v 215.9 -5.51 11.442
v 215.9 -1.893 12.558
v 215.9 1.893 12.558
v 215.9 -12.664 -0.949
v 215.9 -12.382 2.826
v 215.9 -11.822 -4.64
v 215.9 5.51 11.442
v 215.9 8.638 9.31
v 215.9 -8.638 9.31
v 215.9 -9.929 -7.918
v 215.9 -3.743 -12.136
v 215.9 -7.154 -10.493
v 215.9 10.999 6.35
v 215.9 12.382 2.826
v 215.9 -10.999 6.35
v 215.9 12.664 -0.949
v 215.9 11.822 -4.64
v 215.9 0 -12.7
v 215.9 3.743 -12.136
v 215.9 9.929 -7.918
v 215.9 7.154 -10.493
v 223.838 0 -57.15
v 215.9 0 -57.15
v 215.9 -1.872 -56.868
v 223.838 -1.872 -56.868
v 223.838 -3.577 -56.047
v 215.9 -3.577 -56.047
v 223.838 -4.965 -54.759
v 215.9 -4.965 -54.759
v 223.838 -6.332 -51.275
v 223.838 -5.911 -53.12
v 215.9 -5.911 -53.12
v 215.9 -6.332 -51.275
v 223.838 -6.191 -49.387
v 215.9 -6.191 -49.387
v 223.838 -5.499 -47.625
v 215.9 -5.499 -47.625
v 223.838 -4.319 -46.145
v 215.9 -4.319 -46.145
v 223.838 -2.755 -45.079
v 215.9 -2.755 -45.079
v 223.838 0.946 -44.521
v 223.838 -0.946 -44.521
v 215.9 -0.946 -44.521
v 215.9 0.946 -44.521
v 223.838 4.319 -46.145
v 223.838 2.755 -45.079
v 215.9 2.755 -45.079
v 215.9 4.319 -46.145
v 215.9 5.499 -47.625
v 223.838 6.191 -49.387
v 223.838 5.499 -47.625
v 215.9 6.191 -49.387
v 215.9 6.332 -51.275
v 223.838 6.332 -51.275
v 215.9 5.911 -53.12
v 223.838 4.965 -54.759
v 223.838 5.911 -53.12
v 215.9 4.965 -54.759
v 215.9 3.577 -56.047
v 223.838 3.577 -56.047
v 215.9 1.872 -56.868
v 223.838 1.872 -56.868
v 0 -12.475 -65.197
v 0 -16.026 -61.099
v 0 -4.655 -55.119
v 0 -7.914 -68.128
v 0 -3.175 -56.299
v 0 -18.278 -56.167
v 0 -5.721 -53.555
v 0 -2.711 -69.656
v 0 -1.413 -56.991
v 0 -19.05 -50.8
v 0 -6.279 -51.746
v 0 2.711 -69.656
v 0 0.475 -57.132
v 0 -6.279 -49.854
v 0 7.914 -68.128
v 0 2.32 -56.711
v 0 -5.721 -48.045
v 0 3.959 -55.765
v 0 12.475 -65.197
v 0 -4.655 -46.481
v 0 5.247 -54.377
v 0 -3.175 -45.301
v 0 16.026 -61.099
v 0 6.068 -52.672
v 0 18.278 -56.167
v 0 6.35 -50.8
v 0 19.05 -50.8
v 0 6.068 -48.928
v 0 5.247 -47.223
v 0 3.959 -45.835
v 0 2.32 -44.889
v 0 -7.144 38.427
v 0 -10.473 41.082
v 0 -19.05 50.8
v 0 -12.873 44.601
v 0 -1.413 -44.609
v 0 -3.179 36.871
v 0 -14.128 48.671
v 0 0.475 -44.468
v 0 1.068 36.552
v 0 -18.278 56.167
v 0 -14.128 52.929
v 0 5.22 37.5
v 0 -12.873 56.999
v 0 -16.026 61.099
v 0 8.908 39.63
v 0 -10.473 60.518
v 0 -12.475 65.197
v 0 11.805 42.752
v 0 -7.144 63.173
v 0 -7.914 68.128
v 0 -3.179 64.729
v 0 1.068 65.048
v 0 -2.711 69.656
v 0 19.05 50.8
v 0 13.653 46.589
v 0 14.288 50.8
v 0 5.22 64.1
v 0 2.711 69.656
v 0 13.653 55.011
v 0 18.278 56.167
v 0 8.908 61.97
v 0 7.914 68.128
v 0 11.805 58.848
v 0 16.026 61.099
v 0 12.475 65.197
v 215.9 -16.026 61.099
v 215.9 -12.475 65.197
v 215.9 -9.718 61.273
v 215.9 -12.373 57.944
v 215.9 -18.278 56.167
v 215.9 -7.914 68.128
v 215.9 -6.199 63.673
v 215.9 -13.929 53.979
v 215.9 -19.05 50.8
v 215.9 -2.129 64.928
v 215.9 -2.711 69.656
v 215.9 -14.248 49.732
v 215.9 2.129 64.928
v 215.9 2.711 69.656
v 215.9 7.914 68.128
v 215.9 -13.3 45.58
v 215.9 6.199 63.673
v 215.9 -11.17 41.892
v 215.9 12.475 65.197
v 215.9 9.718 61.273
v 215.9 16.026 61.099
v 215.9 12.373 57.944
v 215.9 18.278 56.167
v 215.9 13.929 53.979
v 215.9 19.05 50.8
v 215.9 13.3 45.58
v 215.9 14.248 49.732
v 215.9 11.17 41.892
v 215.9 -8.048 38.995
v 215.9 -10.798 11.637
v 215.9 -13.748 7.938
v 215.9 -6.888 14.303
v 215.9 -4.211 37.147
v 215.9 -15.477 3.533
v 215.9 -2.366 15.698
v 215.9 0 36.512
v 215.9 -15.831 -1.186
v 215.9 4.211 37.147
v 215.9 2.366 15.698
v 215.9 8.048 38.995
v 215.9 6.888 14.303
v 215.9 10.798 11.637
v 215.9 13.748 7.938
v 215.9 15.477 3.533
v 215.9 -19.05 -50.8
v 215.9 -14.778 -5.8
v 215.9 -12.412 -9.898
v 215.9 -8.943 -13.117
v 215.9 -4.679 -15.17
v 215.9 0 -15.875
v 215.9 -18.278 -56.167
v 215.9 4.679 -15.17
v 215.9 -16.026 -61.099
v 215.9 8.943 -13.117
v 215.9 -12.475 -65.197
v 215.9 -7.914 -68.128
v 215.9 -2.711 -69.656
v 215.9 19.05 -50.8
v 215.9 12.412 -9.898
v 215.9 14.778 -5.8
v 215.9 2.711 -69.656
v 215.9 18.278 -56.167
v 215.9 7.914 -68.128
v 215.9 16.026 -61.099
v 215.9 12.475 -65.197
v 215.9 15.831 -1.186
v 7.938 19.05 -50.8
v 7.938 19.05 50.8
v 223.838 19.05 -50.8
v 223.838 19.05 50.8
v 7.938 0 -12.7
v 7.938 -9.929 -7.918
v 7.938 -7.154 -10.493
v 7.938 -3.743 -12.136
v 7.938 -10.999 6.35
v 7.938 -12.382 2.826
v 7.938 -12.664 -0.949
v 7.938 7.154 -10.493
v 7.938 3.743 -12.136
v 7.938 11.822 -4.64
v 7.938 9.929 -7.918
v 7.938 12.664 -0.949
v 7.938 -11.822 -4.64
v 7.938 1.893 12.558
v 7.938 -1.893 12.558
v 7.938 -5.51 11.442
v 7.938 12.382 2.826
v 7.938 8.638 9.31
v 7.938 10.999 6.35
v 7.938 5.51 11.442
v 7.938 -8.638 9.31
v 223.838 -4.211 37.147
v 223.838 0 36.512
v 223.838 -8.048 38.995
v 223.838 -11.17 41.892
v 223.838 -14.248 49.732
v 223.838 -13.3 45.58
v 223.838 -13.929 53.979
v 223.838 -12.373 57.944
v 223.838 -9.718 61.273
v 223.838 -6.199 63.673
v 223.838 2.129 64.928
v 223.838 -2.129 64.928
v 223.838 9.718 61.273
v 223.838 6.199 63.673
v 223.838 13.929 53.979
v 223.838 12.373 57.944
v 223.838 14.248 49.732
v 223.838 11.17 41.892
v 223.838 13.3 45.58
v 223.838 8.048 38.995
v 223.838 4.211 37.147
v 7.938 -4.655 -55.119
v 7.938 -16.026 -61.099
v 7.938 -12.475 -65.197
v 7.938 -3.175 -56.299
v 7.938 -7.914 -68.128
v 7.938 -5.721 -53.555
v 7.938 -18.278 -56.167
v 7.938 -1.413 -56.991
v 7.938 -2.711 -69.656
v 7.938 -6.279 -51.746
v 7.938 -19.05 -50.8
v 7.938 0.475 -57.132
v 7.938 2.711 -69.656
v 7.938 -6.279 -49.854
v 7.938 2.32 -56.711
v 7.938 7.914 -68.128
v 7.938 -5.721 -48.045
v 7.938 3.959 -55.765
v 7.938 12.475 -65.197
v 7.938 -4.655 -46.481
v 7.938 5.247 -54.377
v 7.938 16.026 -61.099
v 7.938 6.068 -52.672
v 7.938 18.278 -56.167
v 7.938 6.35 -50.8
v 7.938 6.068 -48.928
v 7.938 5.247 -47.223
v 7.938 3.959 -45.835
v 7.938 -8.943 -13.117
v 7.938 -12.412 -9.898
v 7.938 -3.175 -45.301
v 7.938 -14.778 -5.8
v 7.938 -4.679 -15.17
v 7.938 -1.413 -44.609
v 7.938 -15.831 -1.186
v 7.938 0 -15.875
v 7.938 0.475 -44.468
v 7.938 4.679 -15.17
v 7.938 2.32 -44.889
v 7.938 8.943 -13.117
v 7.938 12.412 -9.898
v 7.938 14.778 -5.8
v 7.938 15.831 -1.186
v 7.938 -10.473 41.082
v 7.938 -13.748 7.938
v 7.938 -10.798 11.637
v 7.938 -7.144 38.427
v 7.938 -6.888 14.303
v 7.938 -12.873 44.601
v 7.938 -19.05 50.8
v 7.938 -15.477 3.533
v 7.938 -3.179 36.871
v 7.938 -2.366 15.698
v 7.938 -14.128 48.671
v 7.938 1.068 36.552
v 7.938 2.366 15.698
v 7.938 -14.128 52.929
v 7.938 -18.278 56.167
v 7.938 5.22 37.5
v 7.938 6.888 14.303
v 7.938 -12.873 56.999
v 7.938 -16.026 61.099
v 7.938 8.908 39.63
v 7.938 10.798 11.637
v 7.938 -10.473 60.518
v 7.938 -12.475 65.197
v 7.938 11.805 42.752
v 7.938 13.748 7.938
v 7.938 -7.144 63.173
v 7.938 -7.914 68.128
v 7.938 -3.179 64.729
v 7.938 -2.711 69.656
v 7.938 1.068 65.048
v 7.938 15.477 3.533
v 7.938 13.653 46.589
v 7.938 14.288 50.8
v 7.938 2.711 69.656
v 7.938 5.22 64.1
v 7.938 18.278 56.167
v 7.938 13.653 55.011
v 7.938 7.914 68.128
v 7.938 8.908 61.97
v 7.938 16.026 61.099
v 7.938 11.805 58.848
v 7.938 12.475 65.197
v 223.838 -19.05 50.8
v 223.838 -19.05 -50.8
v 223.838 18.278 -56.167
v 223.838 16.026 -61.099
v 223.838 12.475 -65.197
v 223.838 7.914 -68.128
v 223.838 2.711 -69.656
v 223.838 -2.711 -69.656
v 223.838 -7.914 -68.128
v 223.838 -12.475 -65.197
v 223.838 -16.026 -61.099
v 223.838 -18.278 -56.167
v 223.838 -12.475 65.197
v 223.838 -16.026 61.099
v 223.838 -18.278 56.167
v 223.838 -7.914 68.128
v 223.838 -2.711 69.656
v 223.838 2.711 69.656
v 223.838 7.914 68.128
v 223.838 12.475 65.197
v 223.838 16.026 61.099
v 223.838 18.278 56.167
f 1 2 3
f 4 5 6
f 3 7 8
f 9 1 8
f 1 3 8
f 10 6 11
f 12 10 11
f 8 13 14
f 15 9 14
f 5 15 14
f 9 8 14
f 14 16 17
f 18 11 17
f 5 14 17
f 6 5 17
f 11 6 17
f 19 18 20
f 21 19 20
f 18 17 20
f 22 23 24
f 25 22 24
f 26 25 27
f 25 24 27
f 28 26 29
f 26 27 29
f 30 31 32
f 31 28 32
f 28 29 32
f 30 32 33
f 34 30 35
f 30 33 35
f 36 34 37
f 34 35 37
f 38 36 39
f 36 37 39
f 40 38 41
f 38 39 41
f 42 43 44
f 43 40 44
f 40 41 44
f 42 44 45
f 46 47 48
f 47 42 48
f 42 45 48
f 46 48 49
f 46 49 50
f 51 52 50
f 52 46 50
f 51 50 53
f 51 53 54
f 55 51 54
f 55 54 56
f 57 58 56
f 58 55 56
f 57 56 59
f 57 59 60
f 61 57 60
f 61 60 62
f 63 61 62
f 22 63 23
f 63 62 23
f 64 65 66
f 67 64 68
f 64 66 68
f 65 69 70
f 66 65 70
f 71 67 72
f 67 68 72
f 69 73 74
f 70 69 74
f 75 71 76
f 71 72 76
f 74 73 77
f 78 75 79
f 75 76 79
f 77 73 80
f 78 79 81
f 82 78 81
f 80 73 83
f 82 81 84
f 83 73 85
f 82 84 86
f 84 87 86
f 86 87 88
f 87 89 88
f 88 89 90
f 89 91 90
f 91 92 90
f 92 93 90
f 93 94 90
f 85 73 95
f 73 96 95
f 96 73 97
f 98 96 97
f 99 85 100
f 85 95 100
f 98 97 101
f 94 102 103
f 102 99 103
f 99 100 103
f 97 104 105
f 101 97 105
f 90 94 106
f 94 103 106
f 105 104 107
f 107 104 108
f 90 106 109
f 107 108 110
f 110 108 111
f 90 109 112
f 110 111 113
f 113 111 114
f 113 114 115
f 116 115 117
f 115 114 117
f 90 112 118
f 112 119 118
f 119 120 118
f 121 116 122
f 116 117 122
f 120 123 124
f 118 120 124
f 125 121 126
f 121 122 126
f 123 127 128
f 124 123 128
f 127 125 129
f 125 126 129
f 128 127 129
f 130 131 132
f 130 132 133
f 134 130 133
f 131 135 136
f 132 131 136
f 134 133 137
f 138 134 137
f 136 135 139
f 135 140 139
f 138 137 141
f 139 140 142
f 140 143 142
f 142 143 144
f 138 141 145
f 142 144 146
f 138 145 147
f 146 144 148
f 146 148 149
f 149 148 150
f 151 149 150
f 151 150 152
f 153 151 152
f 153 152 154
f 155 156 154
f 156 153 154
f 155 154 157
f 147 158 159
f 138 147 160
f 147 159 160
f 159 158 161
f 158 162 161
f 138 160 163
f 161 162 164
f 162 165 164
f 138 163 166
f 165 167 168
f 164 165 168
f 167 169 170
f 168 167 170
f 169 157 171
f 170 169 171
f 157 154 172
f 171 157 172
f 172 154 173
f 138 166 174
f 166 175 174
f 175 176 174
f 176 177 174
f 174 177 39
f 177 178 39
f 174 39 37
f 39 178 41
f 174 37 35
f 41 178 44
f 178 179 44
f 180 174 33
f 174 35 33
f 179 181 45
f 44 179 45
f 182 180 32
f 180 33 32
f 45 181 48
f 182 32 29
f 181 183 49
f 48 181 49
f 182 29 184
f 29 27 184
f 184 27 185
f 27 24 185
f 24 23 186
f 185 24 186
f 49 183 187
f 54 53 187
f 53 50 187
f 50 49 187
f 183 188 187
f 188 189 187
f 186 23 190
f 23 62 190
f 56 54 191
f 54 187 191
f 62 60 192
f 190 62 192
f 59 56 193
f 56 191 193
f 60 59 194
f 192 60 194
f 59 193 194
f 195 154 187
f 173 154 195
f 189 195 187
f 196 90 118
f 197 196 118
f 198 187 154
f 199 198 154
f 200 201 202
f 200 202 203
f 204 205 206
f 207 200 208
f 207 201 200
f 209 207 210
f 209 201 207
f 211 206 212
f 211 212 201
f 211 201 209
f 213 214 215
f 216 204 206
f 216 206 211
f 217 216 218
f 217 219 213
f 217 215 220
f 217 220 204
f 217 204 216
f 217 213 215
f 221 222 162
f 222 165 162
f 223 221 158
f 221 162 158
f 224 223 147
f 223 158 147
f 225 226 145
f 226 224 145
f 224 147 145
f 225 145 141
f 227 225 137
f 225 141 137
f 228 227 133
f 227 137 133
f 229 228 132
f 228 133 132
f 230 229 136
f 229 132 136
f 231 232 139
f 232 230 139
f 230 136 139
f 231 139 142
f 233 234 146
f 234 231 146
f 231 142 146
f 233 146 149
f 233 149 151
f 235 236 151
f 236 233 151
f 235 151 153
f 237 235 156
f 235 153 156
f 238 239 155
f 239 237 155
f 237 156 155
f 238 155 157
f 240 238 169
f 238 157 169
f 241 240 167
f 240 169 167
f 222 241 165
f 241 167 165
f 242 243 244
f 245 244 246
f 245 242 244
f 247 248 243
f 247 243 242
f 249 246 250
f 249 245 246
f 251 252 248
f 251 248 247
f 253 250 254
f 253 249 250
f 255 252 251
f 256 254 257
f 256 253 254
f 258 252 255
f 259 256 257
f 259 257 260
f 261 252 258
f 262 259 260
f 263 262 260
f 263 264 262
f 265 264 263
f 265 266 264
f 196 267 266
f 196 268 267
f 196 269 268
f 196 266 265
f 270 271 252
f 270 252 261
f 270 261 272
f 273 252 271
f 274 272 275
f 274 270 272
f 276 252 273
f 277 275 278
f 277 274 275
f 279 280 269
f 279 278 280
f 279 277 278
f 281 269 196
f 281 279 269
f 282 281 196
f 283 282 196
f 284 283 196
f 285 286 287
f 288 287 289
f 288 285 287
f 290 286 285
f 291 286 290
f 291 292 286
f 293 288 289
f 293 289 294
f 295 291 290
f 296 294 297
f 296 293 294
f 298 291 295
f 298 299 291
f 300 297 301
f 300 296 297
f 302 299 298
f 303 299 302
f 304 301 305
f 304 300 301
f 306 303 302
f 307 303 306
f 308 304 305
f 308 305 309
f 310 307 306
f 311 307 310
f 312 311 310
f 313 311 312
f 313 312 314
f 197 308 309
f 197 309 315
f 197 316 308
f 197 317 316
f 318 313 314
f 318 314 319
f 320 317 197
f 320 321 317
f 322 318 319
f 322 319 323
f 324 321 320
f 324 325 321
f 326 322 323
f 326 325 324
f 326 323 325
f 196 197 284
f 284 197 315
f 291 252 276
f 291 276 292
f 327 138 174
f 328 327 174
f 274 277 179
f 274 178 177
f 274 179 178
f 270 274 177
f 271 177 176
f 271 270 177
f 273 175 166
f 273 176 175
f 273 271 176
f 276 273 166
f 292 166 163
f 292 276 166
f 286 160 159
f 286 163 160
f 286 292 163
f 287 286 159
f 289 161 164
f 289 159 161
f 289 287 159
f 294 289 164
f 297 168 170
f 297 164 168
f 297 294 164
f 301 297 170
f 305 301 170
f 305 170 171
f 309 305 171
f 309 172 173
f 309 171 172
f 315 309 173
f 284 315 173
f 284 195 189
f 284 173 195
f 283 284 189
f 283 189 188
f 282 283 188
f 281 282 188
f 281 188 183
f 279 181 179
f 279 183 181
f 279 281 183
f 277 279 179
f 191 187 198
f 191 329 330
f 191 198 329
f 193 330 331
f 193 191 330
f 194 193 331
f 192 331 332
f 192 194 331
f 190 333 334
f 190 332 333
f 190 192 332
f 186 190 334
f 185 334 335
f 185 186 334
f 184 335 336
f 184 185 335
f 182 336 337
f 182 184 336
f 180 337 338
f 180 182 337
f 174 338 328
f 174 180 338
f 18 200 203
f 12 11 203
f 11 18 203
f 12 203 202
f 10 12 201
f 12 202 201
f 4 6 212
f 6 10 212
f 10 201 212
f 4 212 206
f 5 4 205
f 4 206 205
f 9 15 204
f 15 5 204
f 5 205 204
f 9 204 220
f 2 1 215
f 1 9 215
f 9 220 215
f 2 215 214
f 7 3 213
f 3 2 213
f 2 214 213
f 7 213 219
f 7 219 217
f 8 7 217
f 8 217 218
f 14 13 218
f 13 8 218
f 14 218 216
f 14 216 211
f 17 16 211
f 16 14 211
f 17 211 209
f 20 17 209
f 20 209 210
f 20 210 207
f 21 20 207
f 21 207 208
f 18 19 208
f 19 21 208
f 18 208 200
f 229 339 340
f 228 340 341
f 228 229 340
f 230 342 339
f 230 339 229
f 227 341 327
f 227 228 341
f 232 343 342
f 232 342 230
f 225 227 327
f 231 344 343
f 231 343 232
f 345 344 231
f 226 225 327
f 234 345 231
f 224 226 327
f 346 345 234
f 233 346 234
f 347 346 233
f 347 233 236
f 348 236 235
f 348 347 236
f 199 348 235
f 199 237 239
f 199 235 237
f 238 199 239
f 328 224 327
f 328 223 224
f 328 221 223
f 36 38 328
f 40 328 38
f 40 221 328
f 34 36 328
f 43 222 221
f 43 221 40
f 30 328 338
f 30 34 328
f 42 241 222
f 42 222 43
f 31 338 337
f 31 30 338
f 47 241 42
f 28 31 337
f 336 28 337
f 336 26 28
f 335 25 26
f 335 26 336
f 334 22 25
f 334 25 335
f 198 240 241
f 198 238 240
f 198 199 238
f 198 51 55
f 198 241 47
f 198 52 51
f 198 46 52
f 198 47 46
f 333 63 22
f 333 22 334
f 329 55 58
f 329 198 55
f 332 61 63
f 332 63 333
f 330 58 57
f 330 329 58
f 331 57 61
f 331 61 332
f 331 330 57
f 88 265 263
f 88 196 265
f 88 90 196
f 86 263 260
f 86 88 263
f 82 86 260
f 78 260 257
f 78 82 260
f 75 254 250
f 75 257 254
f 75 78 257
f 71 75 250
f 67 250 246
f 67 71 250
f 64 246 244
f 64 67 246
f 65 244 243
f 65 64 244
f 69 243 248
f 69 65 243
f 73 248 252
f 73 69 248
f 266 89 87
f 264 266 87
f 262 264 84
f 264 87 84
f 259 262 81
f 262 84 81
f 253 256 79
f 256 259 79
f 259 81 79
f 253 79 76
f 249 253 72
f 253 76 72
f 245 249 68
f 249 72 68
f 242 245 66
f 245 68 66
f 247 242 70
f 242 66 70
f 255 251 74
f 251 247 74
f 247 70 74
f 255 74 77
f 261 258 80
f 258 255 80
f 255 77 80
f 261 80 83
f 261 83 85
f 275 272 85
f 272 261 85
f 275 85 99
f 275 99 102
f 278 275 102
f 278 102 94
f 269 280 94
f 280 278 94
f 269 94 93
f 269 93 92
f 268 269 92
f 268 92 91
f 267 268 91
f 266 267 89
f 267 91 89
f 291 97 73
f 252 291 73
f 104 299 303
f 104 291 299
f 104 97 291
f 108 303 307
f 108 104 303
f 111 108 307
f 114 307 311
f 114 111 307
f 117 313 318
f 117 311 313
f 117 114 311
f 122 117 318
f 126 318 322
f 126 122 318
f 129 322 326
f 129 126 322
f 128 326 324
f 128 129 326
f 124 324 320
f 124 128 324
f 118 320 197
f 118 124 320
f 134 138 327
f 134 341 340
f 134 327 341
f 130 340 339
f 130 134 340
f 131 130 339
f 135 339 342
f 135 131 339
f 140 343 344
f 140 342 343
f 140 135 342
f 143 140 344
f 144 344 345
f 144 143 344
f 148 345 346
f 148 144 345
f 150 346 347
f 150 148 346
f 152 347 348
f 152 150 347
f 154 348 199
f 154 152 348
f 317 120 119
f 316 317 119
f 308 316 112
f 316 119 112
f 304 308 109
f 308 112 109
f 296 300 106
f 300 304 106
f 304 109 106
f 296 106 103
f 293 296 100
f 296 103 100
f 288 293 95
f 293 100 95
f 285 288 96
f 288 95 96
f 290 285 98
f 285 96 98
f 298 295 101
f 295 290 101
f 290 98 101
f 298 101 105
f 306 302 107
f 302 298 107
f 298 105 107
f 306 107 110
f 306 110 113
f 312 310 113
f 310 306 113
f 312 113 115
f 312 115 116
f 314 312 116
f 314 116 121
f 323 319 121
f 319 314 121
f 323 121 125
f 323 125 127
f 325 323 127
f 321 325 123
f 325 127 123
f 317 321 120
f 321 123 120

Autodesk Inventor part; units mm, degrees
ref_plane "YZ Plane" through (0, 0, 0) normal (1, 0, 0) x (0, 1, 0)
ref_plane "XZ Plane" through (0, 0, 0) normal (0, 1, 0) x (-1, 0, 0)
sketch "Sketch1" plane through (0, 0, 0) normal (1, 0, 0) x (0, 1, 0)
  line L0 (0, -50.8) -> (0, 50.8) construction
  line L1 (19.05, -50.8) -> (19.05, 50.8)
  line L2 (-19.05, 50.8) -> (-19.05, -50.8)
  arc A0 (-19.05, -50.8) -> (19.05, -50.8) centre (0, -50.8) ccw
  arc A1 (19.05, 50.8) -> (-19.05, 50.8) centre (0, 50.8) ccw
  circle A2 centre (0, 50.8) radius 14.2875
  circle A3 centre (0, -50.8) radius 6.35
  point P0 (0, 0)
  dimension "d0" = 50.8
  dimension "d1" = 38.1
  dimension "d2" = 28.575
  dimension "d12" = 12.7
extrude "Extrusion1" add sketch "Sketch1" along normal blind 7.9375
sketch "Sketch2" plane through (7.9375, 0, 0) normal (1, 0, 0) x (0, 0, -1)
  circle A0 centre (0, 0) radius 12.7
  circle A1 centre (0, 0) radius 15.875
  dimension "d5" = 25.4
  dimension "d6" = 31.75
extrude "Extrusion2" add sketch "Sketch2" along normal blind 207.9625
ref_plane "Work Plane1" through (215.9, 0, 0) normal (1, 0, 0) x (0, 0, -1)
sketch "Sketch3" plane through (215.9, 0, 0) normal (1, 0, 0) x (0, 0, -1)
  arc A0 (-50.8, 19.05) -> (-50.8, -19.05) centre (-50.8, 0) ccw projected
  circle A1 centre (-50.8, 0) radius 14.2875 projected
  line L0 (50.8, 19.05) -> (-50.8, 19.05) projected
  arc A2 (50.8, -19.05) -> (50.8, 19.05) centre (50.8, 0) ccw projected
  line L1 (-50.8, -19.05) -> (50.8, -19.05) projected
  circle A3 centre (50.8, 0) radius 6.35 projected
  point P0 (0, 0)
  dimension "d13" = 101.6
extrude "Extrusion3" add sketch "Sketch3" along normal blind 7.9375
properties part number "toggle" material "Steel, Wrought"
